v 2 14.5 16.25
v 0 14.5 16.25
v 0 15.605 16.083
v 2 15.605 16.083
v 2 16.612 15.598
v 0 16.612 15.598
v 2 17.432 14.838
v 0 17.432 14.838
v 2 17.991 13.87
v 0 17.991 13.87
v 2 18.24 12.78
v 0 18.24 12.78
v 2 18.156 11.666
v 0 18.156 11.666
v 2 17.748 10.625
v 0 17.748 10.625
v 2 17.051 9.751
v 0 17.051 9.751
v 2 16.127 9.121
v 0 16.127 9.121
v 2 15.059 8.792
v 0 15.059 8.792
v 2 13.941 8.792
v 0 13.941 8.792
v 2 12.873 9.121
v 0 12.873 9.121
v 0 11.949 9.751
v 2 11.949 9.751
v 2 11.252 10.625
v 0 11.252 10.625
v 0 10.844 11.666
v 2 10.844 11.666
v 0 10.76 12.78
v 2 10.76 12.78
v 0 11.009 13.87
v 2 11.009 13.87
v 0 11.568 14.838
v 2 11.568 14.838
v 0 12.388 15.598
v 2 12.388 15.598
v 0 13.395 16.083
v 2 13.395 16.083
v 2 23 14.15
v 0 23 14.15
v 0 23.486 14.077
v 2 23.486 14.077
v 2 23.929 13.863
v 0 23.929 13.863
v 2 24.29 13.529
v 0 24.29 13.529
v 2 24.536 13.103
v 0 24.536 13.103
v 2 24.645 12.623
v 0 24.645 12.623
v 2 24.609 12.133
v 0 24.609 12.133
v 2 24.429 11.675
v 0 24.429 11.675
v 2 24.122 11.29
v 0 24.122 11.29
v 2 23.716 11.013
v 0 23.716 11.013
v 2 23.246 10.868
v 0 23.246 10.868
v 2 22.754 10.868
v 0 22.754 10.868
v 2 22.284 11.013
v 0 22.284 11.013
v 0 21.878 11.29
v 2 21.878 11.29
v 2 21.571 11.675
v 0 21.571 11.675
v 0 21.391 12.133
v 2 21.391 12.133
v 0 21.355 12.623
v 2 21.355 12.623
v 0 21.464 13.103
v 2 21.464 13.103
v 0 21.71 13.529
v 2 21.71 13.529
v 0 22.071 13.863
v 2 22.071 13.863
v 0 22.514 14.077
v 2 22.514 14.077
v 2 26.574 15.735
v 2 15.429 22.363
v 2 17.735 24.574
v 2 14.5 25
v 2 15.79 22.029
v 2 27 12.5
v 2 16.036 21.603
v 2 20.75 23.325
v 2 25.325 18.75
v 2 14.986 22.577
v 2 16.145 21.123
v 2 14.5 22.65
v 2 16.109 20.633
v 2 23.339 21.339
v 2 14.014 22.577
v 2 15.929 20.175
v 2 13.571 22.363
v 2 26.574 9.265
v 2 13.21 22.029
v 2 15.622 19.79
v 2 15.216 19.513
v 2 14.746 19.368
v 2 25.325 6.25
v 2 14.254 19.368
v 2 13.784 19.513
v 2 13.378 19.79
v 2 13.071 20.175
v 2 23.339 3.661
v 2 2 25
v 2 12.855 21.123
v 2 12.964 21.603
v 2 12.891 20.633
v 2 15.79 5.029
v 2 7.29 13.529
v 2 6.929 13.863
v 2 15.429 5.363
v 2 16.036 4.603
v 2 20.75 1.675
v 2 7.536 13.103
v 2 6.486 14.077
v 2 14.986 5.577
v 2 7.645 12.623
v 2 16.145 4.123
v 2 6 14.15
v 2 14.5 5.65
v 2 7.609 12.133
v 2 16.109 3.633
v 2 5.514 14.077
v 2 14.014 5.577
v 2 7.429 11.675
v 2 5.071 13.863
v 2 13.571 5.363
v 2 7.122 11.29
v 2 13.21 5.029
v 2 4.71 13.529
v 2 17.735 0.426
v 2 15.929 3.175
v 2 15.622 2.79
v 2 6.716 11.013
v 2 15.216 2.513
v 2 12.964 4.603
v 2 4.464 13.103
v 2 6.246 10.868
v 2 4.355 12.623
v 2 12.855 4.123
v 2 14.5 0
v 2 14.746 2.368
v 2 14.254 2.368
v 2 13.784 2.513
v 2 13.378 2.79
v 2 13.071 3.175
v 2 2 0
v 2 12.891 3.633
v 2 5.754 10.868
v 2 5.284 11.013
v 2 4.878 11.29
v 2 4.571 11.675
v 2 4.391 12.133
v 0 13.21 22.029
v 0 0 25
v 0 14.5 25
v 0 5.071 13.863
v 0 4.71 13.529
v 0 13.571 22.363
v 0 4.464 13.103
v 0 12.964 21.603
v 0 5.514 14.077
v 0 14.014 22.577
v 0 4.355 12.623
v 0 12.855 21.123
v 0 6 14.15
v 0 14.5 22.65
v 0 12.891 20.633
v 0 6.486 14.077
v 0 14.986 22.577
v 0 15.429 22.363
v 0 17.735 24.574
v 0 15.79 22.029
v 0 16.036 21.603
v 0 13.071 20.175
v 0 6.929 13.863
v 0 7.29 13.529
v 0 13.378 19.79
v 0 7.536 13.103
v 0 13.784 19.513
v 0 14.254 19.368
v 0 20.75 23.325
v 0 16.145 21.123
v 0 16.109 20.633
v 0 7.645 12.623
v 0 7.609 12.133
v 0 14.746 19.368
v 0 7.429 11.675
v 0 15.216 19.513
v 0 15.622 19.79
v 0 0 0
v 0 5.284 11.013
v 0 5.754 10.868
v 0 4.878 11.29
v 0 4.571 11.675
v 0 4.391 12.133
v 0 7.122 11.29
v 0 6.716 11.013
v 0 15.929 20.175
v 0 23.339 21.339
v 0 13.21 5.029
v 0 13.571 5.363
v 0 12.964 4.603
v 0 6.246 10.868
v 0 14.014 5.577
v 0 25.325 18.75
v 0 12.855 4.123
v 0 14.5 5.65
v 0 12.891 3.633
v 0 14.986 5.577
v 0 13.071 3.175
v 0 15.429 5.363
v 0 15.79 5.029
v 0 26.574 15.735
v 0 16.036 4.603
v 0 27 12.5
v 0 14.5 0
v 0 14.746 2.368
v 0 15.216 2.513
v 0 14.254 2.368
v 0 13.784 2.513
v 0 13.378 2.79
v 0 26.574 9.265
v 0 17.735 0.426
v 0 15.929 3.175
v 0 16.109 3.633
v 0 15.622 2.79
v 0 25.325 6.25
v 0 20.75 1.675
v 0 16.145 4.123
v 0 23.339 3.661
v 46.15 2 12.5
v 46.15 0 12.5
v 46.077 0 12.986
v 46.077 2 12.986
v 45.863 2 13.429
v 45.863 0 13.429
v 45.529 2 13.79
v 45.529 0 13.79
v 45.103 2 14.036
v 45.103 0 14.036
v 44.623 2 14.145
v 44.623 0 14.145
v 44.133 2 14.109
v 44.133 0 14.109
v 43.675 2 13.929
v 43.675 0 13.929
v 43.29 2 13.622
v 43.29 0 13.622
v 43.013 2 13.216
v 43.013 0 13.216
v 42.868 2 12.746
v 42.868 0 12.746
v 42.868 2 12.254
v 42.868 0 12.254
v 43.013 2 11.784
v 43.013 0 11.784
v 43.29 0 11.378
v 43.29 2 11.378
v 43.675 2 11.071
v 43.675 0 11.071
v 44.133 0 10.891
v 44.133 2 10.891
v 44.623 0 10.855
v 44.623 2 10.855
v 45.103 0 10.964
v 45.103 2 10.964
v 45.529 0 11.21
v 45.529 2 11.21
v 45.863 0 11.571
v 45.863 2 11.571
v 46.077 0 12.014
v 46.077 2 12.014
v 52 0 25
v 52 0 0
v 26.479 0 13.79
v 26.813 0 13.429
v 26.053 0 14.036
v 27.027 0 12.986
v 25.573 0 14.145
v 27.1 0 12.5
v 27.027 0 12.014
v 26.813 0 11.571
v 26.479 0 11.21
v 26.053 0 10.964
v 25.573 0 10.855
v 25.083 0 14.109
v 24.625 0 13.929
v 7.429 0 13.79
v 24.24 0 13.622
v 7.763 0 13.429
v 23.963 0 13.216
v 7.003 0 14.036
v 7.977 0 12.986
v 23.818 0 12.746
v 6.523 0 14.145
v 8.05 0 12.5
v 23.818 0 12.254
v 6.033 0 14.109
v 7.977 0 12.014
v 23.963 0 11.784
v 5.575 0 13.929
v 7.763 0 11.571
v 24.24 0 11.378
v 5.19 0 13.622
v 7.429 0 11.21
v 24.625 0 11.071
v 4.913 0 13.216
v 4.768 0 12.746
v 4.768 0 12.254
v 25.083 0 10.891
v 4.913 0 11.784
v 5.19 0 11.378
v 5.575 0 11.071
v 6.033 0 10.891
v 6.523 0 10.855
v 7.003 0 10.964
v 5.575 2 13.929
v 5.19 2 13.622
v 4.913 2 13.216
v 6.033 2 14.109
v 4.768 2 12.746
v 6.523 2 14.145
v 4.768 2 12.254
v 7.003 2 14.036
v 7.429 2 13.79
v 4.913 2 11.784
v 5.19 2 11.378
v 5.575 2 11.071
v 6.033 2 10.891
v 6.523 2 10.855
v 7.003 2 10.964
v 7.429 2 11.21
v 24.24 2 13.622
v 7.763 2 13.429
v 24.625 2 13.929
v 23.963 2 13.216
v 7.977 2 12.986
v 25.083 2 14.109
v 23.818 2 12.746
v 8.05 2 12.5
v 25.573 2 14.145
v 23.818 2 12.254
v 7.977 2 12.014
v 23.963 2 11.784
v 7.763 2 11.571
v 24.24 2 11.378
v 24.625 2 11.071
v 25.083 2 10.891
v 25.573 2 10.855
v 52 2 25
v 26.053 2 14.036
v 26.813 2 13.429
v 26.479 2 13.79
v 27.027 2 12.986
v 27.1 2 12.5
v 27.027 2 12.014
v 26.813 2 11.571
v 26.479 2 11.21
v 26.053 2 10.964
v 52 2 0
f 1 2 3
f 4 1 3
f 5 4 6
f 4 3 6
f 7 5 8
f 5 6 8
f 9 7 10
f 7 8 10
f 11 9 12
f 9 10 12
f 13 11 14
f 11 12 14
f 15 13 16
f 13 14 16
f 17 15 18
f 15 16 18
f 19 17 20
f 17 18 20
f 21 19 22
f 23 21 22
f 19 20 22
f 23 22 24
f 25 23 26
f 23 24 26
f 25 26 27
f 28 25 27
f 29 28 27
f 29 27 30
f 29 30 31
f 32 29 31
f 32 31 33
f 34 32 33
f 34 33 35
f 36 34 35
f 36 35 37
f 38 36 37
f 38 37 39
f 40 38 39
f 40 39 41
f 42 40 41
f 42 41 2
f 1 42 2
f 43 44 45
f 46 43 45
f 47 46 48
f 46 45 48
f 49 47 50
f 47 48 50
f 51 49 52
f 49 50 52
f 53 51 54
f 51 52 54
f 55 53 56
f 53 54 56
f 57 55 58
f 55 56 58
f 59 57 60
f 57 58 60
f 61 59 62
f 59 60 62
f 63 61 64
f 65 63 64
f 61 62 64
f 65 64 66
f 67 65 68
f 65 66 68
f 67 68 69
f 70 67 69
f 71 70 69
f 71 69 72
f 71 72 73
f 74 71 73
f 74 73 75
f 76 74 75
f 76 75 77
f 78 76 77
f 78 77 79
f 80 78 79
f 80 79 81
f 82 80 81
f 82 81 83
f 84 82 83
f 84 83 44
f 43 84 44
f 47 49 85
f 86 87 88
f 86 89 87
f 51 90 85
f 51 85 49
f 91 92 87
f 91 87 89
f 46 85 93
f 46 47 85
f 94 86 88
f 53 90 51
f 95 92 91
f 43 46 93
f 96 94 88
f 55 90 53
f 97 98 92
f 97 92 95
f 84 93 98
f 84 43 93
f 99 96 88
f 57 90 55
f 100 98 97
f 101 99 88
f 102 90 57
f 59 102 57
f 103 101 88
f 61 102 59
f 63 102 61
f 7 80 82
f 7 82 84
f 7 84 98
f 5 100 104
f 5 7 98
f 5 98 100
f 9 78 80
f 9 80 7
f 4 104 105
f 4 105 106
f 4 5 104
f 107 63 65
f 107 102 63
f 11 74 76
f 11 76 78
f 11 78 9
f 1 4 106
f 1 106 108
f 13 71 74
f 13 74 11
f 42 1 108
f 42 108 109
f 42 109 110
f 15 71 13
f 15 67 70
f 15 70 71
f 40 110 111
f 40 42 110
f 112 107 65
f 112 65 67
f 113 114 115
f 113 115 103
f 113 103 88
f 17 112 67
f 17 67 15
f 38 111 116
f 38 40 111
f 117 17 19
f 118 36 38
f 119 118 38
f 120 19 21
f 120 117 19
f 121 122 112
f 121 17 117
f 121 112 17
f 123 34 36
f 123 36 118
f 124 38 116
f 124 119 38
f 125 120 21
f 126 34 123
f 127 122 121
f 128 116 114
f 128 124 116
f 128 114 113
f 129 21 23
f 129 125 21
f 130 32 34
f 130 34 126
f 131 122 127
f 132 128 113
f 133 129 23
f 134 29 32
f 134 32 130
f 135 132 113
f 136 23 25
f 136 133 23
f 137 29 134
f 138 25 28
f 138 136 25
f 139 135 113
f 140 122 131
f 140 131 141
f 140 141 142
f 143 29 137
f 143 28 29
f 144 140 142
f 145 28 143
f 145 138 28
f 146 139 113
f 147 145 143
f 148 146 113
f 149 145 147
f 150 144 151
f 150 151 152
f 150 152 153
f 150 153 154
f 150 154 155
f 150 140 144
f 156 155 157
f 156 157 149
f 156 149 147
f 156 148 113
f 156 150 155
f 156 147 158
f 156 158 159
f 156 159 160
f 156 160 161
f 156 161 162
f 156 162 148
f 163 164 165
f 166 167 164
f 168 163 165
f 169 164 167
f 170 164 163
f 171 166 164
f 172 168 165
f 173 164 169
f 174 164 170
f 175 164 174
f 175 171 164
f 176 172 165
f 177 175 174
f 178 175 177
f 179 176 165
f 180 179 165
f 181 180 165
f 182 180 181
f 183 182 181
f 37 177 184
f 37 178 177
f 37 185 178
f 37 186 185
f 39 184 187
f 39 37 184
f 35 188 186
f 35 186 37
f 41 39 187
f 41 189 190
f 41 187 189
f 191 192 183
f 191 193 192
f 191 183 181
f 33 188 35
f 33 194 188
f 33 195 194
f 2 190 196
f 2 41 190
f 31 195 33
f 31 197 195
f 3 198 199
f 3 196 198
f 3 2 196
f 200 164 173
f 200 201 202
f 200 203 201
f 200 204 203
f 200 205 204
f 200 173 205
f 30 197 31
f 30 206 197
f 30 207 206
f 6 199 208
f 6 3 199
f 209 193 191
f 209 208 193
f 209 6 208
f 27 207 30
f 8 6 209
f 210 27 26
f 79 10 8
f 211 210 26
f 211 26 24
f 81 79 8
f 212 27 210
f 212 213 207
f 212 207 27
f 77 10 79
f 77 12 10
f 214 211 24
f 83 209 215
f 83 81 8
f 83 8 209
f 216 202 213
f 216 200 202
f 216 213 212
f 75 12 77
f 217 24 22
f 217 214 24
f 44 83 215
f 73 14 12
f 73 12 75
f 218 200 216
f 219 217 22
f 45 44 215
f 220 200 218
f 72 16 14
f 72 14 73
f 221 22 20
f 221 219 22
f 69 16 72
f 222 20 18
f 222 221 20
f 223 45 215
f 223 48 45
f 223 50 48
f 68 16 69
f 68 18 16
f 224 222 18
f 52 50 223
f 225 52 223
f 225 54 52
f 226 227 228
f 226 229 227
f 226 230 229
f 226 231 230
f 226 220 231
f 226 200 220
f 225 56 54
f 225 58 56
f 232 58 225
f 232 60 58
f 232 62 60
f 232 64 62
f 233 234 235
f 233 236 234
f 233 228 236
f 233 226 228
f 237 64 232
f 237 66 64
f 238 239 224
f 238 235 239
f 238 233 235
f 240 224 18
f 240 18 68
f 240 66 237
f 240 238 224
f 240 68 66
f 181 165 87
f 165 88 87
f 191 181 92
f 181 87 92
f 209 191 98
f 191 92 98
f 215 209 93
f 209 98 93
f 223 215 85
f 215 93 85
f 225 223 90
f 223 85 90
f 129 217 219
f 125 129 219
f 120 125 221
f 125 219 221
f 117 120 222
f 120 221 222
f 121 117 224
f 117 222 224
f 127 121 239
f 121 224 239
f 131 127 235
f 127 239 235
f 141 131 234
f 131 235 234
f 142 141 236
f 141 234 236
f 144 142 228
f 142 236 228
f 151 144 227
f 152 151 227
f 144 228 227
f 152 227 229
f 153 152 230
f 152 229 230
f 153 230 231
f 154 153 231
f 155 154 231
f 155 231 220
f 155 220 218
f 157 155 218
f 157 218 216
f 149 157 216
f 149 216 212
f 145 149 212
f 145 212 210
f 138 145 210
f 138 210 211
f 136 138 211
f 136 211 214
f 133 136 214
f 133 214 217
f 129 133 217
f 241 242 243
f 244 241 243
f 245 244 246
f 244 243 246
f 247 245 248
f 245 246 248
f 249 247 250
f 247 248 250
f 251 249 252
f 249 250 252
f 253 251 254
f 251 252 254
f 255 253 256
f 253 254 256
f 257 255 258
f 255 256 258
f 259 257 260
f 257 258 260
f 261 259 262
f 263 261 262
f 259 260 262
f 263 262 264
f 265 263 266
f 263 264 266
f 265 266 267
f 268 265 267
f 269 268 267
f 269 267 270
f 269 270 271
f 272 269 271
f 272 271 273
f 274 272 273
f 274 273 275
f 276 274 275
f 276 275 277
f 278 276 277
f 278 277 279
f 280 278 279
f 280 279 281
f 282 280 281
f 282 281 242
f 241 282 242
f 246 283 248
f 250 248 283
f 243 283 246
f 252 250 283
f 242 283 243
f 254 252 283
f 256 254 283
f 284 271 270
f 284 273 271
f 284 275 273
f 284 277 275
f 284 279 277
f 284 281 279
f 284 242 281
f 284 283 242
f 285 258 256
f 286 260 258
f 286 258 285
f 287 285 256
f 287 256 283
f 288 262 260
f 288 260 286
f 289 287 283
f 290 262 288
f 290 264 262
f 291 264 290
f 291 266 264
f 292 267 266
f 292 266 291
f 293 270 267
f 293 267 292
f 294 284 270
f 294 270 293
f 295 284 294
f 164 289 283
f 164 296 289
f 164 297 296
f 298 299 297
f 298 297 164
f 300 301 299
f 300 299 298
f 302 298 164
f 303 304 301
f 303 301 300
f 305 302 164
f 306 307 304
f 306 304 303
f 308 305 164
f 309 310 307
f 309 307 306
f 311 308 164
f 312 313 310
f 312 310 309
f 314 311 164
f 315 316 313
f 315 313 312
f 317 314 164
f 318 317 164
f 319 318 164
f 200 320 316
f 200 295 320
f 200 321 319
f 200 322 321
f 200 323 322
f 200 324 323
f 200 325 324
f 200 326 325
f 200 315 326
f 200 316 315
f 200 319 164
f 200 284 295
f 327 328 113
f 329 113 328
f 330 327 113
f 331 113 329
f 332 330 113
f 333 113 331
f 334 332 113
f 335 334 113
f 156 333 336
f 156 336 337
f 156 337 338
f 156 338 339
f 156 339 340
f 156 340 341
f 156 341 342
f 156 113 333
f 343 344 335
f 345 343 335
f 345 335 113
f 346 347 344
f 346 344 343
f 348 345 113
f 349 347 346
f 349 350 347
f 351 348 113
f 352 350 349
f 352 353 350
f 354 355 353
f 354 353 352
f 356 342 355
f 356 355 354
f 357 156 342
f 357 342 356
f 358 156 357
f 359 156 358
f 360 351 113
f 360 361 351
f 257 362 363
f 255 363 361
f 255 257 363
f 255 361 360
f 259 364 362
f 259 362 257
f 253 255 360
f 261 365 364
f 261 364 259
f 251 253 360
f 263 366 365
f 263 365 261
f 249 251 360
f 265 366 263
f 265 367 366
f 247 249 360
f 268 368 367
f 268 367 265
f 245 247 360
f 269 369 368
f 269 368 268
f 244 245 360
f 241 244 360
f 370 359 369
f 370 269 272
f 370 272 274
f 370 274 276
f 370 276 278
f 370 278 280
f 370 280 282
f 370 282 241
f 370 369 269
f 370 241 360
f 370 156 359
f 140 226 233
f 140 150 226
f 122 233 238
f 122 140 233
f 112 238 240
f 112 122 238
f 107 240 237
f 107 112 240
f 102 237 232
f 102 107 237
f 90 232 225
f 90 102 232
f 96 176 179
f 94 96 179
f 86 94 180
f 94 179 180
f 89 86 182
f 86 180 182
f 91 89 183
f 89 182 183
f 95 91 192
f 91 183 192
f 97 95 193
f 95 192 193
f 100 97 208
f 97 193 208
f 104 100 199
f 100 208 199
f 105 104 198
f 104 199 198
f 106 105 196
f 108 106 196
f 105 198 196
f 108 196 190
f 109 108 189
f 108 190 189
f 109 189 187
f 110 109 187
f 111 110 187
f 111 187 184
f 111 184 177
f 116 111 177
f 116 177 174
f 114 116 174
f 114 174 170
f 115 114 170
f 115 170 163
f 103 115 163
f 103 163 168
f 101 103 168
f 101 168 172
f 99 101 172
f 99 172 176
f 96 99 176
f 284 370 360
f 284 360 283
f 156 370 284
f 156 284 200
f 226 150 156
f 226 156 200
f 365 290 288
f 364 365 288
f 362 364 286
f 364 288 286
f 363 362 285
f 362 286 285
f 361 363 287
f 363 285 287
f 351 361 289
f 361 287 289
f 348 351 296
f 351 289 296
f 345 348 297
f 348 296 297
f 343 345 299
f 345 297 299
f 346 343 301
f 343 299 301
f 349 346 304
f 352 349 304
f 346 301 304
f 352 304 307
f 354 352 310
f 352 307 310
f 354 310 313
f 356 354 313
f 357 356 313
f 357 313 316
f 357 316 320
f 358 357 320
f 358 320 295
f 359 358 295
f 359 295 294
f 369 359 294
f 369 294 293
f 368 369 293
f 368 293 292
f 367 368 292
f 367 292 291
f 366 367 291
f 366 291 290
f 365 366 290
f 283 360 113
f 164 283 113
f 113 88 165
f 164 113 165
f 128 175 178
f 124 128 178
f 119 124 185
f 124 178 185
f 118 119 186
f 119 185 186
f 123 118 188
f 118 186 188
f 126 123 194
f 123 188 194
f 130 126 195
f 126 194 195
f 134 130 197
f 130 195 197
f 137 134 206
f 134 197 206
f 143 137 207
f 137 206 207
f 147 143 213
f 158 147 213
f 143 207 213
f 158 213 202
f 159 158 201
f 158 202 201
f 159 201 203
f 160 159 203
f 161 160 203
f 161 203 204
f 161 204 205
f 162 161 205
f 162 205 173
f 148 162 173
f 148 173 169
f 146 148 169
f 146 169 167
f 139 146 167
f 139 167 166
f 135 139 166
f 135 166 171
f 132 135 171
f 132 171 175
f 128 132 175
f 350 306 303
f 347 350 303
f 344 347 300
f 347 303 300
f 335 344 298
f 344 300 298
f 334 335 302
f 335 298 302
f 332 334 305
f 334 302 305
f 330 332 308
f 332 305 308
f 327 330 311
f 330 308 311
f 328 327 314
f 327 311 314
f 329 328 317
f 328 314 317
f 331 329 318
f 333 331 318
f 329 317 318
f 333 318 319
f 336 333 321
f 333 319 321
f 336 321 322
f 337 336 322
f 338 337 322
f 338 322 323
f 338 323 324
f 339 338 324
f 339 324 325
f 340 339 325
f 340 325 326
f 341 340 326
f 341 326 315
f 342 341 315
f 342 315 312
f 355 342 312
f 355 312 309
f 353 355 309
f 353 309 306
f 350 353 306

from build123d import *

# Parameters (mm, degrees)
P_IDAT_VYSUNUT_M1_DEPTH  = 25
SKICA2_R                 = 3.75
SKICA2_R_2               = 1.65
ODEBRAT_VYSUNUT_M2_DEPTH = 25
ZAOBLIT2_R               = 12.5
SKICA3_R                 = 1.65
ODEBRAT_VYSUNUT_M3_DEPTH = 10


with BuildPart() as part:
    # Skica1 → Přidat vysunutím1 (new body)
    with BuildSketch(Plane.XY):
        Polygon((0, 0), (0, 27), (2, 27), (2, 2), (52, 2), (52, 0), align=None)
    extrude(amount=P_IDAT_VYSUNUT_M1_DEPTH)

    # Skica2 → Odebrat vysunutím2 (cut)
    with BuildSketch(Plane.ZY):
        with Locations((12.5, 14.5)):
            Circle(SKICA2_R)
        with Locations((12.5, 23)):
            Circle(SKICA2_R_2)
        with Locations((21, 14.5)):
            Circle(SKICA2_R_2)
        with Locations((4, 14.5)):
            Circle(SKICA2_R_2)
        with Locations((12.5, 6)):
            Circle(SKICA2_R_2)
    extrude(amount=-ODEBRAT_VYSUNUT_M2_DEPTH, mode=Mode.SUBTRACT)

    # Zaoblit2
    zaoblit2_edges = [part.edges().sort_by_distance(p)[0] for p in [
        (1, 27, 0),
        (1, 27, 25),
    ]]
    fillet(zaoblit2_edges, radius=ZAOBLIT2_R - 0.0001)  # a hair under: the kernel refuses the full size

    # Skica3 → Odebrat vysunutím3 (cut)
    with BuildSketch(Plane.XZ):
        with Locations((6.4, 12.5)):
            Circle(SKICA3_R)
        with Locations((25.45, 12.5)):
            Circle(SKICA3_R)
        with Locations((44.5, 12.5)):
            Circle(SKICA3_R)
    extrude(amount=-ODEBRAT_VYSUNUT_M3_DEPTH, mode=Mode.SUBTRACT)


solid = part.part
